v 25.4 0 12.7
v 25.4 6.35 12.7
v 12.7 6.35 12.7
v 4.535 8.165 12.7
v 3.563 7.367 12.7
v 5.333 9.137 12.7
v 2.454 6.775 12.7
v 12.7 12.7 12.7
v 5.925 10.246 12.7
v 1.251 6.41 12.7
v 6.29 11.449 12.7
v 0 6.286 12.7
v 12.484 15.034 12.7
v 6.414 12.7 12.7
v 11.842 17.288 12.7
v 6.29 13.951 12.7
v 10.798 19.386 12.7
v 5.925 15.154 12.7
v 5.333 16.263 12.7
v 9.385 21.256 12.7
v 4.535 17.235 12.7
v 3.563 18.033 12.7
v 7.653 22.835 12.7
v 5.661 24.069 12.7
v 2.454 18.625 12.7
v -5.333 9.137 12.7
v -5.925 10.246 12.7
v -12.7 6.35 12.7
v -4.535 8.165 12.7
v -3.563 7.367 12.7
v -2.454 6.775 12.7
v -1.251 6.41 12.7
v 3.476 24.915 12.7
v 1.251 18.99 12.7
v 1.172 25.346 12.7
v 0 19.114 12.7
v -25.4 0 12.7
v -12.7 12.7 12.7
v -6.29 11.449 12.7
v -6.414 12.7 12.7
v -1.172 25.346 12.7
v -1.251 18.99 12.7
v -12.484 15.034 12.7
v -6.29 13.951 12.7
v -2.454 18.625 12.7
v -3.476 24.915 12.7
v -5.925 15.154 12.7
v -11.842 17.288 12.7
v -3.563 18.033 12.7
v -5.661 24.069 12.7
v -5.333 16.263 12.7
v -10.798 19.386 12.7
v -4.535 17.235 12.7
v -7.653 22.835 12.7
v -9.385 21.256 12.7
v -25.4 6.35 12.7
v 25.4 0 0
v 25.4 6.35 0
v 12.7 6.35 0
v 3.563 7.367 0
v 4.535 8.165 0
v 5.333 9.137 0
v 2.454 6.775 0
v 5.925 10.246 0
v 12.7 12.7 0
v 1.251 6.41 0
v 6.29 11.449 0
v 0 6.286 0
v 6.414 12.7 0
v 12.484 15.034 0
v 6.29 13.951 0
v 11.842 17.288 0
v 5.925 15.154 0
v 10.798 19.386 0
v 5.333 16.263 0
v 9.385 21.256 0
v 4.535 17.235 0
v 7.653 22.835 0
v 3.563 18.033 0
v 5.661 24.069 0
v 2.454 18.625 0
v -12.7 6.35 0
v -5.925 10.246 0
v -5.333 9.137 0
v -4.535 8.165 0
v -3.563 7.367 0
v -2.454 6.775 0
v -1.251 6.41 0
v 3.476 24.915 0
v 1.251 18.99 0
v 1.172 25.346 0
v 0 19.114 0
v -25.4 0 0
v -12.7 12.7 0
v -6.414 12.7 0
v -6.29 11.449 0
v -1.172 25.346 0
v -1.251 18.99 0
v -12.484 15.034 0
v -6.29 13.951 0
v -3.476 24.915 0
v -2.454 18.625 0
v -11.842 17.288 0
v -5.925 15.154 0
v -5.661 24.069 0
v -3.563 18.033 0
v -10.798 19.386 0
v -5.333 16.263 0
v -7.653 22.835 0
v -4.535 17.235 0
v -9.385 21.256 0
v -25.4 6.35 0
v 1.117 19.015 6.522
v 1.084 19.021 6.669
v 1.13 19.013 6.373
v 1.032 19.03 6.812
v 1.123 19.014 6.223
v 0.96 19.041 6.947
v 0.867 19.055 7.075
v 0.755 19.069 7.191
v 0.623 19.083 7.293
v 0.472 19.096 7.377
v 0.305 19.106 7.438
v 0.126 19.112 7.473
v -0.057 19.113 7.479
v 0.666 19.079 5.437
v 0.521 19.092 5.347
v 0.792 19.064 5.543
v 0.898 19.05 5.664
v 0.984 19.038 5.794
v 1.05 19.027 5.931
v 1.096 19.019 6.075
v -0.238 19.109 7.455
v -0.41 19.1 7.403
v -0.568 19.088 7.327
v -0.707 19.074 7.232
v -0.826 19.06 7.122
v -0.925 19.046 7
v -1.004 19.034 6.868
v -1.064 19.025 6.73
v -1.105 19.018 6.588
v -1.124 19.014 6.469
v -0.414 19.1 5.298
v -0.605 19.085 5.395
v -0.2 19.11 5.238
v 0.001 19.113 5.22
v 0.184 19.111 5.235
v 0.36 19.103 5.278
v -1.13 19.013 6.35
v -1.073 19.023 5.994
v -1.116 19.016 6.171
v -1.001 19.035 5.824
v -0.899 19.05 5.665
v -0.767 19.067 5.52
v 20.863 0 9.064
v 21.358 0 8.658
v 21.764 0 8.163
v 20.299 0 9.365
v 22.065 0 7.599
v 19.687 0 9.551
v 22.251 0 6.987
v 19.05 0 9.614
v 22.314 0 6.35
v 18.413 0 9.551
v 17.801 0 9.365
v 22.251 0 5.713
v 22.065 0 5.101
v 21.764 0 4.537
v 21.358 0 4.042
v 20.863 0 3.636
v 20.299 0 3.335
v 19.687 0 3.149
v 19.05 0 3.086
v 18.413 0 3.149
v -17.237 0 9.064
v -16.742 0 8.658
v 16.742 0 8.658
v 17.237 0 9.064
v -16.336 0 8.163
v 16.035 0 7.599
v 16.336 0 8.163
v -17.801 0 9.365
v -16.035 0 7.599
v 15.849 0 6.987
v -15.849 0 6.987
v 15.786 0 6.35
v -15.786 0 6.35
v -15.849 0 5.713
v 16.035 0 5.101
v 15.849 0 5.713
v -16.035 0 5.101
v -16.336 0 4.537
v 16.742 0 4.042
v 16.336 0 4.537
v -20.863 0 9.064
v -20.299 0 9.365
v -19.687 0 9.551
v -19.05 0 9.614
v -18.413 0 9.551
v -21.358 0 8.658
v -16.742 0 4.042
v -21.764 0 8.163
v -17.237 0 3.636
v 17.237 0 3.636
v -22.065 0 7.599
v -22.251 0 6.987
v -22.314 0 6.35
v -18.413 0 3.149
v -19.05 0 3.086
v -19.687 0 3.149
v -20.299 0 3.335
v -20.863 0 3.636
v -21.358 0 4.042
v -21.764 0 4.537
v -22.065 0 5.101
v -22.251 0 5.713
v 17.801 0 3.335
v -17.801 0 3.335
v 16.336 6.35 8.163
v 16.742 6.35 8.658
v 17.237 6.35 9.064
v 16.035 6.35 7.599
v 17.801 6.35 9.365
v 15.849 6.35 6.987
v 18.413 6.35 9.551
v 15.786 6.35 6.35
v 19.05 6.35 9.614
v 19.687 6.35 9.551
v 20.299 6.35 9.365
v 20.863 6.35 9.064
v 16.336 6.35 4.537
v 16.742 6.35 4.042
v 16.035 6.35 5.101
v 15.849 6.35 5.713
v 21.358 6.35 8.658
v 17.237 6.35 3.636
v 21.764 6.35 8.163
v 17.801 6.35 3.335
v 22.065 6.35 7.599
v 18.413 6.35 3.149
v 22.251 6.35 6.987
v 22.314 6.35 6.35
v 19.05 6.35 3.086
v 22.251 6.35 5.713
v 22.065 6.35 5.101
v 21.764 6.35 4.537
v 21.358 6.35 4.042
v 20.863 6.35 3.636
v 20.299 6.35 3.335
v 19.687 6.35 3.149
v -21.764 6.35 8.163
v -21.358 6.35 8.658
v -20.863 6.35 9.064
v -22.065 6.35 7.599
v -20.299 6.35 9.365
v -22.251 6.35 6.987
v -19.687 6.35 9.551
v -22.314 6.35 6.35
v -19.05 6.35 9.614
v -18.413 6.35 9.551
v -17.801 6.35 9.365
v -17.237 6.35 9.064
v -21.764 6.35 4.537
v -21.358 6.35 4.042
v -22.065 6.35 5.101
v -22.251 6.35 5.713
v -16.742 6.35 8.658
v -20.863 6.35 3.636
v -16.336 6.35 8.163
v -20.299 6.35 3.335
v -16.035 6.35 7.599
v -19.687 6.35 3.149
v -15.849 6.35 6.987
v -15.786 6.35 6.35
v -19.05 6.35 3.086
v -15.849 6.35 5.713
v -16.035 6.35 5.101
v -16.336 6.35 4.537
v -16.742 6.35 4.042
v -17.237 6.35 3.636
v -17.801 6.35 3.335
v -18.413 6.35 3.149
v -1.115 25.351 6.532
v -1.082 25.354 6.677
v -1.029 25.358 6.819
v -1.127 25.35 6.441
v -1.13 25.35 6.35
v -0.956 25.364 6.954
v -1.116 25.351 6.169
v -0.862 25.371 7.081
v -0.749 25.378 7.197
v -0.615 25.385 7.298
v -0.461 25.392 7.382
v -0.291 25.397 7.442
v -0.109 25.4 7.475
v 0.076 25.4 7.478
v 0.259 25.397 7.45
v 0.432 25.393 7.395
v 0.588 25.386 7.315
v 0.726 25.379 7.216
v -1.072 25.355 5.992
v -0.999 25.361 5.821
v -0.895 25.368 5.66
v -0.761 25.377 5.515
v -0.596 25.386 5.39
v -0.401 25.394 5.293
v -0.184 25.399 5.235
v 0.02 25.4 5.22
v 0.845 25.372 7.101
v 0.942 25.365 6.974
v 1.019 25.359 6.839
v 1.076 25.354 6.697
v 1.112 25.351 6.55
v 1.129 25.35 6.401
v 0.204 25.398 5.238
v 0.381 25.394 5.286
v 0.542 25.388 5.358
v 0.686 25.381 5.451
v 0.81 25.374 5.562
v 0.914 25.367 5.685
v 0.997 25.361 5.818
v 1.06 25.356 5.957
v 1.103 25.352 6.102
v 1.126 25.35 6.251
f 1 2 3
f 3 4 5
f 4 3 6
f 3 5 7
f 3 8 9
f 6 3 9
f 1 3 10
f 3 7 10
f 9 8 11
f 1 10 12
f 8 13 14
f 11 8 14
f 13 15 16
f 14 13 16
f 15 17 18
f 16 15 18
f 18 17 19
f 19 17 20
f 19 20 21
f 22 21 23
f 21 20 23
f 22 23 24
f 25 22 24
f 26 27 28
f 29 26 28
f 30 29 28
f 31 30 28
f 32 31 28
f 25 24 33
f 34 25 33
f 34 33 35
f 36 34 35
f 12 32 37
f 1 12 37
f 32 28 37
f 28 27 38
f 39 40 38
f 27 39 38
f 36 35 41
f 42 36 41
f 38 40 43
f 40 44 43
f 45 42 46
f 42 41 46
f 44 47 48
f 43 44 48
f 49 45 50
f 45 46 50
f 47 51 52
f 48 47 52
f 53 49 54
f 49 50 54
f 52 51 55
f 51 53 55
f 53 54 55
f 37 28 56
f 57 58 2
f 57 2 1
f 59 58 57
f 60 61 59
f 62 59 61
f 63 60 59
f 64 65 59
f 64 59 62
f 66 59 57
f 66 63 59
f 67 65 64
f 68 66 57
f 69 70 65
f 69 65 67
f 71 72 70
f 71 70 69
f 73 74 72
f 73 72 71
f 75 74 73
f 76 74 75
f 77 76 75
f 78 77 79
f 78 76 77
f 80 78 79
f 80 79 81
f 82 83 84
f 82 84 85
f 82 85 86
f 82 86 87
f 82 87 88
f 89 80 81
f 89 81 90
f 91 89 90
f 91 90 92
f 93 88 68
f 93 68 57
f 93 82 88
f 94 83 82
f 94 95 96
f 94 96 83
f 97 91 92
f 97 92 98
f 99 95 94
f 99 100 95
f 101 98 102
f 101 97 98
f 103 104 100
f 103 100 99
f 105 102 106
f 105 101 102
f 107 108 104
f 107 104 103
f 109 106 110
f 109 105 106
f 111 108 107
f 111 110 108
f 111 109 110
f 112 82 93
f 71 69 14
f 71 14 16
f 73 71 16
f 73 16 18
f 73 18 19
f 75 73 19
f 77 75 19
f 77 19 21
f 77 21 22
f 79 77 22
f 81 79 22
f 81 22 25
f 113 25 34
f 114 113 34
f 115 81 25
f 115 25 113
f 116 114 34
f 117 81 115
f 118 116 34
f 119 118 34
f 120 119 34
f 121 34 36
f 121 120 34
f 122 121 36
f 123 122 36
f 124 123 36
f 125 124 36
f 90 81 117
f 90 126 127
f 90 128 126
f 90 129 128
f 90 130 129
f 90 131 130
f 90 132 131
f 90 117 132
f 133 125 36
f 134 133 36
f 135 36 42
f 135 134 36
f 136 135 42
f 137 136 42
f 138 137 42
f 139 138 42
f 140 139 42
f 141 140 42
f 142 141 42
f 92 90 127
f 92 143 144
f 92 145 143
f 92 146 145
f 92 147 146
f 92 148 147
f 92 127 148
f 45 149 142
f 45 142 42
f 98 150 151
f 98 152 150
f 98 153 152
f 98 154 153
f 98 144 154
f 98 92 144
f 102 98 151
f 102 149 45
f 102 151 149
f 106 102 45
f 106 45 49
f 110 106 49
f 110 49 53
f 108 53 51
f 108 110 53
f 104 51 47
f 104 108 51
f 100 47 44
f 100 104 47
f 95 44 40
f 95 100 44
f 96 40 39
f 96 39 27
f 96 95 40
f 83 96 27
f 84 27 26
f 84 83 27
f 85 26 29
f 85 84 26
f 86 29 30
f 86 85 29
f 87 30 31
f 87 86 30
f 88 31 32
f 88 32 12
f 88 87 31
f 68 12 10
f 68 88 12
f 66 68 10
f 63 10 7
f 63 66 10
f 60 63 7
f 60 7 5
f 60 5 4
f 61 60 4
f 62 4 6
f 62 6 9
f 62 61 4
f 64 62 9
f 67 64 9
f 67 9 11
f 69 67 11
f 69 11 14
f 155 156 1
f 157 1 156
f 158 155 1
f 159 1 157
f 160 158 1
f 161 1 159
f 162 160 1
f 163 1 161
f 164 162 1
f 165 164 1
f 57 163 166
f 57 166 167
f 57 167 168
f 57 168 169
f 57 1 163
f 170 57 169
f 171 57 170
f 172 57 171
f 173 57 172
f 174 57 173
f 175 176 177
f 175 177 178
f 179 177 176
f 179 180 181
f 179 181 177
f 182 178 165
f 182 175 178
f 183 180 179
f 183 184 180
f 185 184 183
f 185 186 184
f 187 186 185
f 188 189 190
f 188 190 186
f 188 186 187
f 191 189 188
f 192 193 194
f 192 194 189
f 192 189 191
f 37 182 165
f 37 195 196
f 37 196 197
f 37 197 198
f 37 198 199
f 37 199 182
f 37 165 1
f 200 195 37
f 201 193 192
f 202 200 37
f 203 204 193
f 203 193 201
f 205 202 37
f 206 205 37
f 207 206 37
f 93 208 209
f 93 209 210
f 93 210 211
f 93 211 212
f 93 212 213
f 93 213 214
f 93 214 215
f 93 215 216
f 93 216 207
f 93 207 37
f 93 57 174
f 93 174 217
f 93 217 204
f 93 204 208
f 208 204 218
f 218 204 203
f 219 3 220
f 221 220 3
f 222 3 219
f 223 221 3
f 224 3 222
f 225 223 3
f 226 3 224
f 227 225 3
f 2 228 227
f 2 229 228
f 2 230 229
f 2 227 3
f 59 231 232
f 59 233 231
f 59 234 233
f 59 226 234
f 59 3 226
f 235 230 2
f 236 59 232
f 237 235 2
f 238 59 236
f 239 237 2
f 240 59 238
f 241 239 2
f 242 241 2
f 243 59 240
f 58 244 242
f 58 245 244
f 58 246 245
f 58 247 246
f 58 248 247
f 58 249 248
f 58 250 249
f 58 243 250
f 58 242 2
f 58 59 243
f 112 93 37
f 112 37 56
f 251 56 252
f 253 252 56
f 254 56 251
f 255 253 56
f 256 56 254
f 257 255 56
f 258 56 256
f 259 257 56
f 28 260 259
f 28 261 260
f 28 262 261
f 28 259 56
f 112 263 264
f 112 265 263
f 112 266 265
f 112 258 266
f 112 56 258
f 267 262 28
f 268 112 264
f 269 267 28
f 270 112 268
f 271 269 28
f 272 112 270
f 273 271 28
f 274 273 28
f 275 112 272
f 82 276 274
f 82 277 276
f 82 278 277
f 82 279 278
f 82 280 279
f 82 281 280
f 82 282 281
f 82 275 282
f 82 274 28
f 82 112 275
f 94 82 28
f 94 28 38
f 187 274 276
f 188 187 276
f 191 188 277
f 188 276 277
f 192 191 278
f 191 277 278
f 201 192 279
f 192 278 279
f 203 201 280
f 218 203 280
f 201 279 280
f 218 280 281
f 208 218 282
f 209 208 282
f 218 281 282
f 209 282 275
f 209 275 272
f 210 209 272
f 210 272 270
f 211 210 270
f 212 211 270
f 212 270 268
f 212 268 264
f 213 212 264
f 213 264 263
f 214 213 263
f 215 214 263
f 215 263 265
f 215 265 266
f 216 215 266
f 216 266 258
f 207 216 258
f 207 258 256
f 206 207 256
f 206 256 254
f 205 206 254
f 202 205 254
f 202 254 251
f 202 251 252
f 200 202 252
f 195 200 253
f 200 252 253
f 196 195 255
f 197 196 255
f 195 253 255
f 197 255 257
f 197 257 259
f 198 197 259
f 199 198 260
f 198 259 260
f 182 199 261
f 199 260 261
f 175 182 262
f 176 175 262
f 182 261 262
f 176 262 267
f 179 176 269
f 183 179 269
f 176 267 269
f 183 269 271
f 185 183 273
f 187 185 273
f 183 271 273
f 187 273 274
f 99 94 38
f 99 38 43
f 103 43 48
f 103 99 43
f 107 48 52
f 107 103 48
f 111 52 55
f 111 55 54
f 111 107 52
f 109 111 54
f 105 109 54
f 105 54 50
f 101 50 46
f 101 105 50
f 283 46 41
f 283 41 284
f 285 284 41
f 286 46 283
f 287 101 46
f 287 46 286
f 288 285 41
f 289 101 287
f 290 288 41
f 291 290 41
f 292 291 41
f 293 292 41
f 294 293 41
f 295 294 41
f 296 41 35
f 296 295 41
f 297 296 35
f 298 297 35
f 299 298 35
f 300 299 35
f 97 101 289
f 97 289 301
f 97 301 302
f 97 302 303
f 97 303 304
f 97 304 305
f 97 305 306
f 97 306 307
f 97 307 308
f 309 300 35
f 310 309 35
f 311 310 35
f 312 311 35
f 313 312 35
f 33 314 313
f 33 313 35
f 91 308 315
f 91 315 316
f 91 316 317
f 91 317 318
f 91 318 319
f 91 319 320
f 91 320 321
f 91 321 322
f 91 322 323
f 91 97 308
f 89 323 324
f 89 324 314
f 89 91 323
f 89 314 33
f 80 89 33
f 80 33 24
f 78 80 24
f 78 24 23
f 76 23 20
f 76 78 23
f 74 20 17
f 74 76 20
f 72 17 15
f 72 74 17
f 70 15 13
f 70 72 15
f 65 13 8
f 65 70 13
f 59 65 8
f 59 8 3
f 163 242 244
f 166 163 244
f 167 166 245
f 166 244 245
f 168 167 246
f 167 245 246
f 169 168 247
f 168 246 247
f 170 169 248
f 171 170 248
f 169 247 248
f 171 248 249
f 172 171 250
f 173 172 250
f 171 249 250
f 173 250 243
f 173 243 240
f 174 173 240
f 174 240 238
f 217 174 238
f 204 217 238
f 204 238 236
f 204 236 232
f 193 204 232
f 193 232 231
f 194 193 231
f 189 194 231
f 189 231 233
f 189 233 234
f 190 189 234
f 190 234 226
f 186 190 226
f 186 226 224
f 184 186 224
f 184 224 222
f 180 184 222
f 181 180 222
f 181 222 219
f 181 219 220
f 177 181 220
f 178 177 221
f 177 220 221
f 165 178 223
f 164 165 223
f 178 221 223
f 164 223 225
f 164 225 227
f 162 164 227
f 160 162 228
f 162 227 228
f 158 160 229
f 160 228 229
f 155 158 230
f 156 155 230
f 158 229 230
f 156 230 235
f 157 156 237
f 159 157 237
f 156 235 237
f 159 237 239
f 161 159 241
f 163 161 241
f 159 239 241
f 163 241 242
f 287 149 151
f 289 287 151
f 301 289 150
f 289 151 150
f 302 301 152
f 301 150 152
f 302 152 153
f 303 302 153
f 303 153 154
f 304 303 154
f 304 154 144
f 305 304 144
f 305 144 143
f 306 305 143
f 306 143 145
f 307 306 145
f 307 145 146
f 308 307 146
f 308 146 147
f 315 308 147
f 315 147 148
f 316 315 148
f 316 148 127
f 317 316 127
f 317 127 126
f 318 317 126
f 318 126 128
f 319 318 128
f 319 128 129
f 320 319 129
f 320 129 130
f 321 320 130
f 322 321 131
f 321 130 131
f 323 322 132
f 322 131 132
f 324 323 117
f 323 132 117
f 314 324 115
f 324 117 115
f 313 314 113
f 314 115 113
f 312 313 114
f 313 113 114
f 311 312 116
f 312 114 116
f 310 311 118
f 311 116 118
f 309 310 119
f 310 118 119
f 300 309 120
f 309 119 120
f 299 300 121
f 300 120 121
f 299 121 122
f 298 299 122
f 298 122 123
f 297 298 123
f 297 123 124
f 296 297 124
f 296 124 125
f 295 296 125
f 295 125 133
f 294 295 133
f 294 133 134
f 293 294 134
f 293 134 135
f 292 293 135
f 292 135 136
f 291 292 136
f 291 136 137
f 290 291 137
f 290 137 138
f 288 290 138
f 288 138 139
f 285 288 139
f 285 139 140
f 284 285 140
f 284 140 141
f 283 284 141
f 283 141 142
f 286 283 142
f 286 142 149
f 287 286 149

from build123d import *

# Parameters (mm, degrees)
SKETCH1_R                 = 6.4135
BOSS_EXTRUDE1_DEPTH       = 12.7
SKETCH2_R                 = 3.2639
CUT_EXTRUDE1_DEPTH        = 7.35
F_4_40_TAPPED_HOLE1_D     = 2.2606
F_4_40_TAPPED_HOLE1_DEPTH = 7.62
F_4_40_TAPPED_HOLE1_TIP   = 0.679152758


with BuildPart() as part:
    # Sketch1 → Boss-Extrude1 (new body)
    with BuildSketch(Plane.XY):
        with BuildLine():
            Line((12.7, 12.7), (12.7, 6.35))
            Line((12.7, 6.35), (25.4, 6.35))
            Line((25.4, 6.35), (25.4, 0))
            Line((25.4, 0), (-25.4, 0))
            Line((-25.4, 0), (-25.4, 6.35))
            Line((-25.4, 6.35), (-12.7, 6.35))
            Line((-12.7, 6.35), (-12.7, 12.7))
            ThreePointArc((-12.7, 12.7), (0, 25.4), (12.7, 12.7))
        make_face()
        with Locations((0, 12.7)):
            Circle(SKETCH1_R, mode=Mode.SUBTRACT)
    extrude(amount=BOSS_EXTRUDE1_DEPTH)

    # Sketch2 → Cut-Extrude1 (cut, through all)
    with BuildSketch(Plane(origin=(0, 6.35, 0), x_dir=(1, 0, 0), z_dir=(0, 1, 0))):
        with Locations((19.05, -6.35)):
            Circle(SKETCH2_R)
        with Locations((-19.05, -6.35)):
            Circle(SKETCH2_R)
    extrude(amount=-CUT_EXTRUDE1_DEPTH, mode=Mode.SUBTRACT)

    # #4-40 Tapped Hole1
    with Locations(Plane(origin=(0, 25.4, 6.35), x_dir=(1, 0, 0), z_dir=(0, 1, 0))):
        with Locations((0, 0)):
            Hole(F_4_40_TAPPED_HOLE1_D / 2, depth=F_4_40_TAPPED_HOLE1_DEPTH)
            with Locations((0, 0, -(F_4_40_TAPPED_HOLE1_DEPTH + F_4_40_TAPPED_HOLE1_TIP / 2))):  # 118° drill point
                Cone(0, F_4_40_TAPPED_HOLE1_D / 2, F_4_40_TAPPED_HOLE1_TIP, mode=Mode.SUBTRACT)


solid = part.part
